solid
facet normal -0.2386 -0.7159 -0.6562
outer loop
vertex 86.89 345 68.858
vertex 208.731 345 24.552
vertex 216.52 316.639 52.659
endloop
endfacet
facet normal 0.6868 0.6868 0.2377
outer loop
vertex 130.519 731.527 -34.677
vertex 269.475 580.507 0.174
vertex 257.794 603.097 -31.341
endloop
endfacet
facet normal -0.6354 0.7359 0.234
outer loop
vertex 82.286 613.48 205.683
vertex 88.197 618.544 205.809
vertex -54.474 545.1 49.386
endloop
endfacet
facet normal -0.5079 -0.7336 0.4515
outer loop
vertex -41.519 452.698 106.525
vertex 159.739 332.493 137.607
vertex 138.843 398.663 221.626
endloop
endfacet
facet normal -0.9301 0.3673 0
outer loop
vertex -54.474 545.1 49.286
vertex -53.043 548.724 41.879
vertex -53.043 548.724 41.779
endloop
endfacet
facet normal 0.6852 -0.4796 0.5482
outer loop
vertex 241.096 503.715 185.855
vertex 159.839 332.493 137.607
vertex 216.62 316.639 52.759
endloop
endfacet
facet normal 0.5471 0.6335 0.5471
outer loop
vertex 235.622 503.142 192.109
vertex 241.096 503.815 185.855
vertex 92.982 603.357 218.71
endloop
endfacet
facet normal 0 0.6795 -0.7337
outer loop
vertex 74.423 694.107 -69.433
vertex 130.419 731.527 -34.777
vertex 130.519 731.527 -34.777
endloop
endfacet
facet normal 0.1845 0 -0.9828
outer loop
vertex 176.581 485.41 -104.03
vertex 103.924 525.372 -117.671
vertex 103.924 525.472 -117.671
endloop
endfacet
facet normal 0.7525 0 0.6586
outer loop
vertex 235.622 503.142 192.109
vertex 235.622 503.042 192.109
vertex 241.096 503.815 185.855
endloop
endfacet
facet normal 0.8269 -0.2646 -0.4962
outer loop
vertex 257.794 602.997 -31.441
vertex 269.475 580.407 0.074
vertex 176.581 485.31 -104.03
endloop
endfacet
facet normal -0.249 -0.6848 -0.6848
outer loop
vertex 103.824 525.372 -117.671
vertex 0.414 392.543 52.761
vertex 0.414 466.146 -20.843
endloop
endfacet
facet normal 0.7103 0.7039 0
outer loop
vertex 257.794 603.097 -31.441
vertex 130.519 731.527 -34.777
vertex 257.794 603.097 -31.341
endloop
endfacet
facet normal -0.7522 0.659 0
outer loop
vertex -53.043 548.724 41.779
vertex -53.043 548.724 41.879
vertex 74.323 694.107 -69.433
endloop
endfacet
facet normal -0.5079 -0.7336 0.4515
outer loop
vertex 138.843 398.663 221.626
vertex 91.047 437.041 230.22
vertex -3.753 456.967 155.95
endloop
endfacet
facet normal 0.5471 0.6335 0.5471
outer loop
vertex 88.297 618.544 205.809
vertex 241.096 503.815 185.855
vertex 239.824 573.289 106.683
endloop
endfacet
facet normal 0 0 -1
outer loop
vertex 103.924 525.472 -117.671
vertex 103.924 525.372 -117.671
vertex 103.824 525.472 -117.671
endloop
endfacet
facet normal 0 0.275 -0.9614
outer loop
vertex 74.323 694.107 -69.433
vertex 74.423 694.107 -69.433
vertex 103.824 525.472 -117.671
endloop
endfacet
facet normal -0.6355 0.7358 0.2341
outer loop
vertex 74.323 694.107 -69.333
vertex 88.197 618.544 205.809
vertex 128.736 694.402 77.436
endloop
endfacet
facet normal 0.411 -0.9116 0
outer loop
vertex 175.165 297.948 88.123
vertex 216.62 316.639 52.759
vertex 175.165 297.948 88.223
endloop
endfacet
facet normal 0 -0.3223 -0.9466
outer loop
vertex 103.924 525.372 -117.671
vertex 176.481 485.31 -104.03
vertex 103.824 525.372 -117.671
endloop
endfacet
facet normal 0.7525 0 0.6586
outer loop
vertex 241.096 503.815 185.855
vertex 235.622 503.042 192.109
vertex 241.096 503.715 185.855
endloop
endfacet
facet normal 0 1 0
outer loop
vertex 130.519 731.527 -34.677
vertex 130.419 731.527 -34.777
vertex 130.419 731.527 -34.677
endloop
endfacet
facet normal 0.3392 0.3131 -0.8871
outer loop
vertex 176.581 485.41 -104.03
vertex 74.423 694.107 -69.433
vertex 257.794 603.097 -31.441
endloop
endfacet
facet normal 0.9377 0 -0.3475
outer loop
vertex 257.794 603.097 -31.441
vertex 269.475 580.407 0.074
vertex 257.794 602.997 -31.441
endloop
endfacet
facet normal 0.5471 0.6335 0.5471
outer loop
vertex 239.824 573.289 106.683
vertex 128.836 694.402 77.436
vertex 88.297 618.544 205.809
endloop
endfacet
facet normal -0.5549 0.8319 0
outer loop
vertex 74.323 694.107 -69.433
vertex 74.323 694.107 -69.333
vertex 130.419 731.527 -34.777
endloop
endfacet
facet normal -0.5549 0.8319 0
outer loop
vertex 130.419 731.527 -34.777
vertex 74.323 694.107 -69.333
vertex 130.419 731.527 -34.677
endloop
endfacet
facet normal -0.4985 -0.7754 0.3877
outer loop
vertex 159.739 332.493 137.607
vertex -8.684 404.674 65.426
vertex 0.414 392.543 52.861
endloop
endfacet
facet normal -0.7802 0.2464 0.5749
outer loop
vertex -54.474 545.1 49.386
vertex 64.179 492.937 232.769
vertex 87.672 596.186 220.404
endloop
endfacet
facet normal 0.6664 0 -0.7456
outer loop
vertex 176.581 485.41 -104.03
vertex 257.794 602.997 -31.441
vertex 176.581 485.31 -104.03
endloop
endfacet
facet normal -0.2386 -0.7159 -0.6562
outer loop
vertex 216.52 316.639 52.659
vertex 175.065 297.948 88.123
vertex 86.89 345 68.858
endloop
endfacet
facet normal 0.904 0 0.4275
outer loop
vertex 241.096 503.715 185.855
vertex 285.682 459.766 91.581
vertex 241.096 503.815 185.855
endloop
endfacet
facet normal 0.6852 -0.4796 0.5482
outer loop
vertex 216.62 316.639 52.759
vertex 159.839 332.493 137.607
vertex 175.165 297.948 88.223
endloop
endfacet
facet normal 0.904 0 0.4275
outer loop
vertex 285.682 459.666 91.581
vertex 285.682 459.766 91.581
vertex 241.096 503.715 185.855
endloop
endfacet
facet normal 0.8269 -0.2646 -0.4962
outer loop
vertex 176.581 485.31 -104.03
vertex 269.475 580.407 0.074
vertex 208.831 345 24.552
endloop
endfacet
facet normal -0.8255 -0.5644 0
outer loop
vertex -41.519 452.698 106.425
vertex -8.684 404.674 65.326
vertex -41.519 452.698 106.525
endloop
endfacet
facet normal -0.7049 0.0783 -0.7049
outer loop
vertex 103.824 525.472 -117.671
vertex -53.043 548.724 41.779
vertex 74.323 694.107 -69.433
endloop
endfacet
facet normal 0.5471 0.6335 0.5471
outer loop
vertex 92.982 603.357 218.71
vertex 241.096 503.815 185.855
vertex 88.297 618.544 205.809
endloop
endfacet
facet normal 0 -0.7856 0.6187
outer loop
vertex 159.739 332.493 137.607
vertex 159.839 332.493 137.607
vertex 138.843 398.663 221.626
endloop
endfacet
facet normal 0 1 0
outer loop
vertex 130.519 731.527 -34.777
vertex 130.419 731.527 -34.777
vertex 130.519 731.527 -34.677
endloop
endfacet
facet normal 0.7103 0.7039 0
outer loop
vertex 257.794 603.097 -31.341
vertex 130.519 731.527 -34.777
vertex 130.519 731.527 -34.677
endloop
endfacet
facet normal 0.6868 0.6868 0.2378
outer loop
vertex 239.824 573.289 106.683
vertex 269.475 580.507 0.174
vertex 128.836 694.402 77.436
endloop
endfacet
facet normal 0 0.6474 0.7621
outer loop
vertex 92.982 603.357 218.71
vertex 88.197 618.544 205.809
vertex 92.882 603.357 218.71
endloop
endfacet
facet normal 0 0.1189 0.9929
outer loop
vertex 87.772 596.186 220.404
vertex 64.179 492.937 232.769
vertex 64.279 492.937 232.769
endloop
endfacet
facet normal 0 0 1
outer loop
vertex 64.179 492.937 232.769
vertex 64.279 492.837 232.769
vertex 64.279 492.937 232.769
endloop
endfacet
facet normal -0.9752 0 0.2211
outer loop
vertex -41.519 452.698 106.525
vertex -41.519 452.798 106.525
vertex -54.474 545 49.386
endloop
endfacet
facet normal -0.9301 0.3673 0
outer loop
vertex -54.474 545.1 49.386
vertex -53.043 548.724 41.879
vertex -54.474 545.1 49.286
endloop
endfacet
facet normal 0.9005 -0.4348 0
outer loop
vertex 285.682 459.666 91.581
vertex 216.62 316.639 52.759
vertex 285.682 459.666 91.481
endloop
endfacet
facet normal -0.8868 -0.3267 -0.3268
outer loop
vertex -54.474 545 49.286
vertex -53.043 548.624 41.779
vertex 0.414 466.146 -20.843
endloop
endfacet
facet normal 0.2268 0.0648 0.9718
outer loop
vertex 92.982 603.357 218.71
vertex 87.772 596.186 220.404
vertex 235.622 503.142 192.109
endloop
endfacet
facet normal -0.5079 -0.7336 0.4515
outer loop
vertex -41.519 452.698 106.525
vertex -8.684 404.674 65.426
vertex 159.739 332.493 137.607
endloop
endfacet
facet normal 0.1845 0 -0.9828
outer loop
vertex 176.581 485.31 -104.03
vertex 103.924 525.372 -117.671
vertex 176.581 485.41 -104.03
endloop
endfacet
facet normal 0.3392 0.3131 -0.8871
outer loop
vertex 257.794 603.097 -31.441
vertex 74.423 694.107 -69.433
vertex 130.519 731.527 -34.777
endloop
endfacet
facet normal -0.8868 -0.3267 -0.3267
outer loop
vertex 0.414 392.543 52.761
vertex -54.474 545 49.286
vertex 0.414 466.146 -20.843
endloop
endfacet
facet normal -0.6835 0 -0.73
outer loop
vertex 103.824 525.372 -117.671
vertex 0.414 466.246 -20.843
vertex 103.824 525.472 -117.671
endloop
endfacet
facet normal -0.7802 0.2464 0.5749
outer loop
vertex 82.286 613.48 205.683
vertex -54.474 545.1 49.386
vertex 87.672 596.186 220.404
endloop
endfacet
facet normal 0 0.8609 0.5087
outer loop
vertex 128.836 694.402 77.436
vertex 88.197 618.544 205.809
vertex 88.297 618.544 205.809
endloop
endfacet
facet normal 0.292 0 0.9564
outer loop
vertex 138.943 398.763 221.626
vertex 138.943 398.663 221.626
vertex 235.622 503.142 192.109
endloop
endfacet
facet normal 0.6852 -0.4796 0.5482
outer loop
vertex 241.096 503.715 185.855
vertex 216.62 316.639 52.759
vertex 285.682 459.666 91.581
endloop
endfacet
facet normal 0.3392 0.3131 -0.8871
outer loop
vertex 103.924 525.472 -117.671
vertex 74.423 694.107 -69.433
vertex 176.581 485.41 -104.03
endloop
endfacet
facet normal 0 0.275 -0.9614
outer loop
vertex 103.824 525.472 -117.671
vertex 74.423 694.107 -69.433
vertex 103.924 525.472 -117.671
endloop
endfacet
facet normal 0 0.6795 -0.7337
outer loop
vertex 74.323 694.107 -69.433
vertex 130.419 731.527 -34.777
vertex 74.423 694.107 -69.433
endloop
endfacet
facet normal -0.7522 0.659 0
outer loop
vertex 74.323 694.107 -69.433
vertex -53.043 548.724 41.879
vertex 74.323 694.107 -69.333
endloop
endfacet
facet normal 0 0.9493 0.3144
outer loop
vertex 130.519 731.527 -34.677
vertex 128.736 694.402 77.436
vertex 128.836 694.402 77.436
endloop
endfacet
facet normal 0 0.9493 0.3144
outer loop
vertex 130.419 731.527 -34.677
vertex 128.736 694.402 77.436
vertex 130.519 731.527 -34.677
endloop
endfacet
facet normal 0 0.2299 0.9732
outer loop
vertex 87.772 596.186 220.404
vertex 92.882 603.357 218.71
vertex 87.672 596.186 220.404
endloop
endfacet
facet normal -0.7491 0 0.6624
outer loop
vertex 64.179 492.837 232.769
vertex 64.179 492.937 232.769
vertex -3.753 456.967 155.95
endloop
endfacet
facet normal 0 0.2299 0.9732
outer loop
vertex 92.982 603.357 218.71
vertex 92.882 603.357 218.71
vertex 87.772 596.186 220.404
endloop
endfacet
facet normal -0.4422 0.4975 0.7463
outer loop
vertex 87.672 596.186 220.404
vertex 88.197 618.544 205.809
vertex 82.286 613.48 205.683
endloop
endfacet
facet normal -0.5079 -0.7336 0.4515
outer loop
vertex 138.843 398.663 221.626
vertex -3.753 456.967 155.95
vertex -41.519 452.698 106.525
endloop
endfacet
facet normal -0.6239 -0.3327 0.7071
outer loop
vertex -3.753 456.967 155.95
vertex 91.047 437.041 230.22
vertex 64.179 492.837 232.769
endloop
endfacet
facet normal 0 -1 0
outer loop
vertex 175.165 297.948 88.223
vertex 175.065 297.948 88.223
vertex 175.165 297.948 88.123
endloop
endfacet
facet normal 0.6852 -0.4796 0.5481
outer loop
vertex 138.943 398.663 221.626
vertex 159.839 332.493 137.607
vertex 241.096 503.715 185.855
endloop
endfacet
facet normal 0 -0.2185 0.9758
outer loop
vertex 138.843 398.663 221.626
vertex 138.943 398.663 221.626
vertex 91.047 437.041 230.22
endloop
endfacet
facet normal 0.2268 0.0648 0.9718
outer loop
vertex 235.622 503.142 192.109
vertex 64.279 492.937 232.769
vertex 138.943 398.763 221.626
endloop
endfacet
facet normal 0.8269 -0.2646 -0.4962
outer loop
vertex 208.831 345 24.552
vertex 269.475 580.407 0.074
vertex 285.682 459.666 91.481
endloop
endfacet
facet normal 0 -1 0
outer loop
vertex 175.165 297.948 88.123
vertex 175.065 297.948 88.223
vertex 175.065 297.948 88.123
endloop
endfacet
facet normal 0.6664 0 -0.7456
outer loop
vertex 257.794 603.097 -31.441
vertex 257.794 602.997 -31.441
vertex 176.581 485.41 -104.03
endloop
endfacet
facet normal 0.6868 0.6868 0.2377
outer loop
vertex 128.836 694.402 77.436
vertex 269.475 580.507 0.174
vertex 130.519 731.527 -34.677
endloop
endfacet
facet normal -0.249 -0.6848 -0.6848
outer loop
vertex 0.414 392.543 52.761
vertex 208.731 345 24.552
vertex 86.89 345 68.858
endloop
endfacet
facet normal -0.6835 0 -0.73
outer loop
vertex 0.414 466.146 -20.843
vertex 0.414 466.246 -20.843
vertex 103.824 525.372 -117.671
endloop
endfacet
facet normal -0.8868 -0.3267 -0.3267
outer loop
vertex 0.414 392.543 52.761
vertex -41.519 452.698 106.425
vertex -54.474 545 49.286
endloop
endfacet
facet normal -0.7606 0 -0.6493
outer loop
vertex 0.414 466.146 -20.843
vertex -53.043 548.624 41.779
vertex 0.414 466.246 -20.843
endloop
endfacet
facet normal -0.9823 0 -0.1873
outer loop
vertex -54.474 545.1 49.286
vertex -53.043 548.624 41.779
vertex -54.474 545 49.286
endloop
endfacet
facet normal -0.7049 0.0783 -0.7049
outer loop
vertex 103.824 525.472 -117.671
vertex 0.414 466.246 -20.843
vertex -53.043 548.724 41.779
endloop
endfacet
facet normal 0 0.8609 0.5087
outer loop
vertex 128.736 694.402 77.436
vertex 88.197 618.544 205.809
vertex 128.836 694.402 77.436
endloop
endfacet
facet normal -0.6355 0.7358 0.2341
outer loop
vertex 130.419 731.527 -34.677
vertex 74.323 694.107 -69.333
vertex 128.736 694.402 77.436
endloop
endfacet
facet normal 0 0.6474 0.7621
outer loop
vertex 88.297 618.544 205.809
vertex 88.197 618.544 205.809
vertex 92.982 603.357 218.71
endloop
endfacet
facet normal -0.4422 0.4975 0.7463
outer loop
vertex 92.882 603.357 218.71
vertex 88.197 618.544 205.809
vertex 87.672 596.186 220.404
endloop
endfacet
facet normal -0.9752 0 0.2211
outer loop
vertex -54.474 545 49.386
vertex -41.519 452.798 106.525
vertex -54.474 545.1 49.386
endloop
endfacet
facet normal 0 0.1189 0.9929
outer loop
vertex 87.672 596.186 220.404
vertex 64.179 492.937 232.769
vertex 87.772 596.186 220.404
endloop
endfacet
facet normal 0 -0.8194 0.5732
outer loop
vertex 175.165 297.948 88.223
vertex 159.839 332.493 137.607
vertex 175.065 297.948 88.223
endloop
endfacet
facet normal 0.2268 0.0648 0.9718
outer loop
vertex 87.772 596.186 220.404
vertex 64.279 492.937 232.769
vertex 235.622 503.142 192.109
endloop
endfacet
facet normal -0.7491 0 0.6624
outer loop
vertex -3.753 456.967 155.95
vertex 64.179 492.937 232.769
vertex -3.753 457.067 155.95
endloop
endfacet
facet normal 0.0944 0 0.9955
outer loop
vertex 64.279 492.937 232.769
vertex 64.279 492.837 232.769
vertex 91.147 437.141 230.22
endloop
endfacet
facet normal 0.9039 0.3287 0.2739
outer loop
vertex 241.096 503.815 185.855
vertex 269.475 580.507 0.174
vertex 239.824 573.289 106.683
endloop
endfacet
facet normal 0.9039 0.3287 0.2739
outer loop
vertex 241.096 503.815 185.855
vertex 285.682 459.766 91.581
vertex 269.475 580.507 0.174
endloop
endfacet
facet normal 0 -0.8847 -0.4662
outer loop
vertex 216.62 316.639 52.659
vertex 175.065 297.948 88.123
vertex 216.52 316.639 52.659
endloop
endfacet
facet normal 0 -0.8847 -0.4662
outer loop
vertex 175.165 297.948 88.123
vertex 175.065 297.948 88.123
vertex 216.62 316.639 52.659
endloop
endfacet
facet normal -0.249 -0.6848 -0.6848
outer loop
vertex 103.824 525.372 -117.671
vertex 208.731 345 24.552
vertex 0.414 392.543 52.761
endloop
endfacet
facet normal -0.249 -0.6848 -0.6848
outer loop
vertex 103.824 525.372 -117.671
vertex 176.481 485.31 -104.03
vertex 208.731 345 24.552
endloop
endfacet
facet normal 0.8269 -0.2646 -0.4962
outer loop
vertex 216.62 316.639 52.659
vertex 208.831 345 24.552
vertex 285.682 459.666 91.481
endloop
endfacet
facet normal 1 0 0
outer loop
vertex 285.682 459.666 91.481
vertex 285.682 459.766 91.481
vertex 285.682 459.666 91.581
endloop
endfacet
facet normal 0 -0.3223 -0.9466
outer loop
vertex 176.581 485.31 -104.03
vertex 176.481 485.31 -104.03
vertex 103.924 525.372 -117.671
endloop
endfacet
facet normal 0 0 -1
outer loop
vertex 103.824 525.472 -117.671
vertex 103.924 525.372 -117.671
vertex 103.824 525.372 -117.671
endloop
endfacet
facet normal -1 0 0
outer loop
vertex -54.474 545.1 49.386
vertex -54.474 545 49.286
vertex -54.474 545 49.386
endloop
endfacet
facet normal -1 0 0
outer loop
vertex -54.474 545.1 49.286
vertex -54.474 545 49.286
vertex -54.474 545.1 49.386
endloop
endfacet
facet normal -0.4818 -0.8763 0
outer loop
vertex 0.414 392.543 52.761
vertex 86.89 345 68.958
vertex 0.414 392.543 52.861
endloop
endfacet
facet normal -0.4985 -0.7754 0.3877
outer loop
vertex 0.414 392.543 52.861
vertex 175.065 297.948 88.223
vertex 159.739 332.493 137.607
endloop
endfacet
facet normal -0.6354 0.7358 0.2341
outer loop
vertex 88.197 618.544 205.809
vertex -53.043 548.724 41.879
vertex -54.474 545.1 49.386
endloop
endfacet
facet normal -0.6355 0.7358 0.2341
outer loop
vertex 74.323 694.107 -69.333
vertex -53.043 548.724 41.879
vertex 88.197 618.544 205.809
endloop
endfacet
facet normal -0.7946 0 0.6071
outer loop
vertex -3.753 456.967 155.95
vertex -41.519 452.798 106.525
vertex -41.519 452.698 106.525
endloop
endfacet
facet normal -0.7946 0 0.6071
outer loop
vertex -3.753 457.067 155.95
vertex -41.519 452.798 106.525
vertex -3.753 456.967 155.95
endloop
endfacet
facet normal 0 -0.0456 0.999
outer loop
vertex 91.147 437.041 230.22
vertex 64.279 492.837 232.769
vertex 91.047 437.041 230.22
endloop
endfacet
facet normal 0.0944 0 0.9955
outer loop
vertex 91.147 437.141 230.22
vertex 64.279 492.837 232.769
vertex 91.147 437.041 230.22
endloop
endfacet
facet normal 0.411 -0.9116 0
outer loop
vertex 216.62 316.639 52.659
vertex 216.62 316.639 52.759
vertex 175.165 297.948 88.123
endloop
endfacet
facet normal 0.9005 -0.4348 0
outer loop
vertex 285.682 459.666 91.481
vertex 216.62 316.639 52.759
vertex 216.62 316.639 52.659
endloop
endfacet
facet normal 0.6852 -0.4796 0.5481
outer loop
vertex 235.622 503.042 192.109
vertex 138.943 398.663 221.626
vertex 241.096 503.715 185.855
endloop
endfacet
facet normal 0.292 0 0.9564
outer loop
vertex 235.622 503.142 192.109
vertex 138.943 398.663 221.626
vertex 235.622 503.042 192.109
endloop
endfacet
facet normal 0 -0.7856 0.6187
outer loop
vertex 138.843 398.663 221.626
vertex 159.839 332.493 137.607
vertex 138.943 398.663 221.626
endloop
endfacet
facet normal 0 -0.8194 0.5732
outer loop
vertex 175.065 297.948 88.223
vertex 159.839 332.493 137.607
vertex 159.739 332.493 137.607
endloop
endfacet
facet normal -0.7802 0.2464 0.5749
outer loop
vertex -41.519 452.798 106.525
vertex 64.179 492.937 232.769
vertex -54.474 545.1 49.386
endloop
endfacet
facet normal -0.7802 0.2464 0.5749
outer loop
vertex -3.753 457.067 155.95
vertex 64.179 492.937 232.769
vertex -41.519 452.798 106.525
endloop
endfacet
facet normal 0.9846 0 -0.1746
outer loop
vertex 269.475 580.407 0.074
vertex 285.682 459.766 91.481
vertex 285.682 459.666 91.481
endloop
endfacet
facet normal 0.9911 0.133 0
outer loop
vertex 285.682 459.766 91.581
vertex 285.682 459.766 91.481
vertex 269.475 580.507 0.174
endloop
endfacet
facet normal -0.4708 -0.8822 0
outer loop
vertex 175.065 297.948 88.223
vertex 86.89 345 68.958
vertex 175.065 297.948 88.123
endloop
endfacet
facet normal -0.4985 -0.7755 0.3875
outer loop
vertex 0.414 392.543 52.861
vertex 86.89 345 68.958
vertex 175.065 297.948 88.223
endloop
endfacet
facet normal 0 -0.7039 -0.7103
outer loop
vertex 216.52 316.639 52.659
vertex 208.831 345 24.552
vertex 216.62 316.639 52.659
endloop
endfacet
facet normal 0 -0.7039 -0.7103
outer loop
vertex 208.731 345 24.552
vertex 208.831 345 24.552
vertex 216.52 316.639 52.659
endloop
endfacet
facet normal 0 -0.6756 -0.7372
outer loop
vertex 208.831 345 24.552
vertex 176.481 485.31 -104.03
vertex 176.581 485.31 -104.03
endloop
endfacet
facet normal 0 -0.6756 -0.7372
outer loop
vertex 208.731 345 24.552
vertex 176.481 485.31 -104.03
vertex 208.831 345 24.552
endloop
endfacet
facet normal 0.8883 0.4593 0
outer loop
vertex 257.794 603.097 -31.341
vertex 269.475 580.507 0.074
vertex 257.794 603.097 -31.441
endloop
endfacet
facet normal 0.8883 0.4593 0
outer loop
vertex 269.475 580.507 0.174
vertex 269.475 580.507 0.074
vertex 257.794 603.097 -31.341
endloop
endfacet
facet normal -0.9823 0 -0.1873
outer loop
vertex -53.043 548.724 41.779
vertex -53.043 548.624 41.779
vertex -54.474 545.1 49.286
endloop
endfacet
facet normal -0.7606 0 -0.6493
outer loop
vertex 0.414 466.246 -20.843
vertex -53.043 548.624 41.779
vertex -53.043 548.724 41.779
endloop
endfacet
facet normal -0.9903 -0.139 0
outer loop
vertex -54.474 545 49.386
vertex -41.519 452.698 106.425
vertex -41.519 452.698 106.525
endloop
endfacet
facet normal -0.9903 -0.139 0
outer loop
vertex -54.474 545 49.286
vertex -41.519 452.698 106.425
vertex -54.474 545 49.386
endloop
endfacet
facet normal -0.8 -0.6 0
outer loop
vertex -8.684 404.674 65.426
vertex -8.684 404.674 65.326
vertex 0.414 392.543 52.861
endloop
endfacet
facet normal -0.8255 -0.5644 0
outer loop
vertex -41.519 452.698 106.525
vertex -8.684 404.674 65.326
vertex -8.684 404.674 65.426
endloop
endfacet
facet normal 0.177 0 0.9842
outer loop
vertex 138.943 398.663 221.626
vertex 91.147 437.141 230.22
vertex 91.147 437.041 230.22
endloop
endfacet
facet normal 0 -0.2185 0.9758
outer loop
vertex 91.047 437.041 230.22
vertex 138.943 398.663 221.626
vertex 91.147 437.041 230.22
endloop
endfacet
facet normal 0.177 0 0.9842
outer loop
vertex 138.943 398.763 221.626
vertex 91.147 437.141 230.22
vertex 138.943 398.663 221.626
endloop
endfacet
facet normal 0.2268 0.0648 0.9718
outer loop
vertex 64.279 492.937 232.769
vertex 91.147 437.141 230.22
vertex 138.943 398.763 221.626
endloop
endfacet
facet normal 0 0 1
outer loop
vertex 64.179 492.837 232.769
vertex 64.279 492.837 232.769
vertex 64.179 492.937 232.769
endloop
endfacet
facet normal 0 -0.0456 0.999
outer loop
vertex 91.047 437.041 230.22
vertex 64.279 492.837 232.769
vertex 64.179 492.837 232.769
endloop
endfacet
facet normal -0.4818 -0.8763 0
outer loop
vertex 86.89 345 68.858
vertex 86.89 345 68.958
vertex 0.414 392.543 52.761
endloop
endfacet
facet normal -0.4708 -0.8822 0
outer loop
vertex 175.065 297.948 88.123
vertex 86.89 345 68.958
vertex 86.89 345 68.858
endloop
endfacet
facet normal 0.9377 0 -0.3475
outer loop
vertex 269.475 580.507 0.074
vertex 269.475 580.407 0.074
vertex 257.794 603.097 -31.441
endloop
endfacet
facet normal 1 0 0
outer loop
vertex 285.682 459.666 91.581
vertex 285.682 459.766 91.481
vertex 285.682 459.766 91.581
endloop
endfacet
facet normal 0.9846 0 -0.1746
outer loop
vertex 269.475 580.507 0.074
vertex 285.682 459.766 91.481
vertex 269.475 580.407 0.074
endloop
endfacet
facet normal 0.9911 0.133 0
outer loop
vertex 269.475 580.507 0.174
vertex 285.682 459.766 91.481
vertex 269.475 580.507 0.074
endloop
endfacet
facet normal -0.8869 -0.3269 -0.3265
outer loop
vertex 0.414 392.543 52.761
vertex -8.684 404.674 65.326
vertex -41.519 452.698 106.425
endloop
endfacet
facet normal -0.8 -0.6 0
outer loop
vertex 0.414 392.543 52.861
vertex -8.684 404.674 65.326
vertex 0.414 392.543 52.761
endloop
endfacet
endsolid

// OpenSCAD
hull(){ translate([257.694182244,602.997100376,-31.4414831267])cube(0.1,0.1,0.1);
translate([176.481013599,485.309875901,-104.030244482])cube(0.1,0.1,0.1);
translate([103.823839662,525.371835443,-117.671413502])cube(0.1,0.1,0.1);
translate([86.8897637795,345.0,68.8582677165])cube(0.1,0.1,0.1);
translate([175.065128901,297.94843962,88.1234735414])cube(0.1,0.1,0.1);
translate([208.731343284,345.0,24.552238806])cube(0.1,0.1,0.1);
translate([216.520013511,316.639081236,52.6591791927])cube(0.1,0.1,0.1);
translate([159.739130435,332.492753623,137.507246377])cube(0.1,0.1,0.1);
translate([138.843348385,398.662730115,221.525703369])cube(0.1,0.1,0.1);
translate([87.6722282024,596.085844995,220.30409042])cube(0.1,0.1,0.1);
translate([-3.7525702536,456.967100754,155.84989719])cube(0.1,0.1,0.1);
translate([91.0470040229,437.041075588,230.119627355])cube(0.1,0.1,0.1);
translate([64.178539626,492.837266251,232.669189671])cube(0.1,0.1,0.1);
translate([74.3226057617,694.007267065,-69.4329094212])cube(0.1,0.1,0.1);
translate([82.2864796722,613.380081941,205.583044437])cube(0.1,0.1,0.1);
translate([130.418796697,731.427202123,-34.7773299253])cube(0.1,0.1,0.1);
translate([269.374893108,580.407046349,0.0743971267317])cube(0.1,0.1,0.1);
translate([285.581709704,459.666262702,91.4808427333])cube(0.1,0.1,0.1);
translate([-53.0432242991,548.623831776,41.7792056075])cube(0.1,0.1,0.1);
translate([-54.4736842105,545.0,49.2857142857])cube(0.1,0.1,0.1);
translate([-8.68421052632,404.674185464,65.3258145363])cube(0.1,0.1,0.1);
translate([-41.5189968464,452.69785253,106.42513891])cube(0.1,0.1,0.1);
translate([0.414364640884,392.542751907,52.7611154959])cube(0.1,0.1,0.1);
translate([0.414364640884,466.14640884,-20.8425414365])cube(0.1,0.1,0.1);
translate([239.724220624,573.189448441,106.582733813])cube(0.1,0.1,0.1);
translate([92.8816229117,603.256801909,218.610501193])cube(0.1,0.1,0.1);
translate([235.522093162,503.04155191,192.008741468])cube(0.1,0.1,0.1);
translate([240.996069072,503.714726941,185.755299733])cube(0.1,0.1,0.1);
translate([88.1970509383,618.44448168,205.709338695])cube(0.1,0.1,0.1);
translate([128.736047275,694.301543007,77.3358502955])cube(0.1,0.1,0.1); }
